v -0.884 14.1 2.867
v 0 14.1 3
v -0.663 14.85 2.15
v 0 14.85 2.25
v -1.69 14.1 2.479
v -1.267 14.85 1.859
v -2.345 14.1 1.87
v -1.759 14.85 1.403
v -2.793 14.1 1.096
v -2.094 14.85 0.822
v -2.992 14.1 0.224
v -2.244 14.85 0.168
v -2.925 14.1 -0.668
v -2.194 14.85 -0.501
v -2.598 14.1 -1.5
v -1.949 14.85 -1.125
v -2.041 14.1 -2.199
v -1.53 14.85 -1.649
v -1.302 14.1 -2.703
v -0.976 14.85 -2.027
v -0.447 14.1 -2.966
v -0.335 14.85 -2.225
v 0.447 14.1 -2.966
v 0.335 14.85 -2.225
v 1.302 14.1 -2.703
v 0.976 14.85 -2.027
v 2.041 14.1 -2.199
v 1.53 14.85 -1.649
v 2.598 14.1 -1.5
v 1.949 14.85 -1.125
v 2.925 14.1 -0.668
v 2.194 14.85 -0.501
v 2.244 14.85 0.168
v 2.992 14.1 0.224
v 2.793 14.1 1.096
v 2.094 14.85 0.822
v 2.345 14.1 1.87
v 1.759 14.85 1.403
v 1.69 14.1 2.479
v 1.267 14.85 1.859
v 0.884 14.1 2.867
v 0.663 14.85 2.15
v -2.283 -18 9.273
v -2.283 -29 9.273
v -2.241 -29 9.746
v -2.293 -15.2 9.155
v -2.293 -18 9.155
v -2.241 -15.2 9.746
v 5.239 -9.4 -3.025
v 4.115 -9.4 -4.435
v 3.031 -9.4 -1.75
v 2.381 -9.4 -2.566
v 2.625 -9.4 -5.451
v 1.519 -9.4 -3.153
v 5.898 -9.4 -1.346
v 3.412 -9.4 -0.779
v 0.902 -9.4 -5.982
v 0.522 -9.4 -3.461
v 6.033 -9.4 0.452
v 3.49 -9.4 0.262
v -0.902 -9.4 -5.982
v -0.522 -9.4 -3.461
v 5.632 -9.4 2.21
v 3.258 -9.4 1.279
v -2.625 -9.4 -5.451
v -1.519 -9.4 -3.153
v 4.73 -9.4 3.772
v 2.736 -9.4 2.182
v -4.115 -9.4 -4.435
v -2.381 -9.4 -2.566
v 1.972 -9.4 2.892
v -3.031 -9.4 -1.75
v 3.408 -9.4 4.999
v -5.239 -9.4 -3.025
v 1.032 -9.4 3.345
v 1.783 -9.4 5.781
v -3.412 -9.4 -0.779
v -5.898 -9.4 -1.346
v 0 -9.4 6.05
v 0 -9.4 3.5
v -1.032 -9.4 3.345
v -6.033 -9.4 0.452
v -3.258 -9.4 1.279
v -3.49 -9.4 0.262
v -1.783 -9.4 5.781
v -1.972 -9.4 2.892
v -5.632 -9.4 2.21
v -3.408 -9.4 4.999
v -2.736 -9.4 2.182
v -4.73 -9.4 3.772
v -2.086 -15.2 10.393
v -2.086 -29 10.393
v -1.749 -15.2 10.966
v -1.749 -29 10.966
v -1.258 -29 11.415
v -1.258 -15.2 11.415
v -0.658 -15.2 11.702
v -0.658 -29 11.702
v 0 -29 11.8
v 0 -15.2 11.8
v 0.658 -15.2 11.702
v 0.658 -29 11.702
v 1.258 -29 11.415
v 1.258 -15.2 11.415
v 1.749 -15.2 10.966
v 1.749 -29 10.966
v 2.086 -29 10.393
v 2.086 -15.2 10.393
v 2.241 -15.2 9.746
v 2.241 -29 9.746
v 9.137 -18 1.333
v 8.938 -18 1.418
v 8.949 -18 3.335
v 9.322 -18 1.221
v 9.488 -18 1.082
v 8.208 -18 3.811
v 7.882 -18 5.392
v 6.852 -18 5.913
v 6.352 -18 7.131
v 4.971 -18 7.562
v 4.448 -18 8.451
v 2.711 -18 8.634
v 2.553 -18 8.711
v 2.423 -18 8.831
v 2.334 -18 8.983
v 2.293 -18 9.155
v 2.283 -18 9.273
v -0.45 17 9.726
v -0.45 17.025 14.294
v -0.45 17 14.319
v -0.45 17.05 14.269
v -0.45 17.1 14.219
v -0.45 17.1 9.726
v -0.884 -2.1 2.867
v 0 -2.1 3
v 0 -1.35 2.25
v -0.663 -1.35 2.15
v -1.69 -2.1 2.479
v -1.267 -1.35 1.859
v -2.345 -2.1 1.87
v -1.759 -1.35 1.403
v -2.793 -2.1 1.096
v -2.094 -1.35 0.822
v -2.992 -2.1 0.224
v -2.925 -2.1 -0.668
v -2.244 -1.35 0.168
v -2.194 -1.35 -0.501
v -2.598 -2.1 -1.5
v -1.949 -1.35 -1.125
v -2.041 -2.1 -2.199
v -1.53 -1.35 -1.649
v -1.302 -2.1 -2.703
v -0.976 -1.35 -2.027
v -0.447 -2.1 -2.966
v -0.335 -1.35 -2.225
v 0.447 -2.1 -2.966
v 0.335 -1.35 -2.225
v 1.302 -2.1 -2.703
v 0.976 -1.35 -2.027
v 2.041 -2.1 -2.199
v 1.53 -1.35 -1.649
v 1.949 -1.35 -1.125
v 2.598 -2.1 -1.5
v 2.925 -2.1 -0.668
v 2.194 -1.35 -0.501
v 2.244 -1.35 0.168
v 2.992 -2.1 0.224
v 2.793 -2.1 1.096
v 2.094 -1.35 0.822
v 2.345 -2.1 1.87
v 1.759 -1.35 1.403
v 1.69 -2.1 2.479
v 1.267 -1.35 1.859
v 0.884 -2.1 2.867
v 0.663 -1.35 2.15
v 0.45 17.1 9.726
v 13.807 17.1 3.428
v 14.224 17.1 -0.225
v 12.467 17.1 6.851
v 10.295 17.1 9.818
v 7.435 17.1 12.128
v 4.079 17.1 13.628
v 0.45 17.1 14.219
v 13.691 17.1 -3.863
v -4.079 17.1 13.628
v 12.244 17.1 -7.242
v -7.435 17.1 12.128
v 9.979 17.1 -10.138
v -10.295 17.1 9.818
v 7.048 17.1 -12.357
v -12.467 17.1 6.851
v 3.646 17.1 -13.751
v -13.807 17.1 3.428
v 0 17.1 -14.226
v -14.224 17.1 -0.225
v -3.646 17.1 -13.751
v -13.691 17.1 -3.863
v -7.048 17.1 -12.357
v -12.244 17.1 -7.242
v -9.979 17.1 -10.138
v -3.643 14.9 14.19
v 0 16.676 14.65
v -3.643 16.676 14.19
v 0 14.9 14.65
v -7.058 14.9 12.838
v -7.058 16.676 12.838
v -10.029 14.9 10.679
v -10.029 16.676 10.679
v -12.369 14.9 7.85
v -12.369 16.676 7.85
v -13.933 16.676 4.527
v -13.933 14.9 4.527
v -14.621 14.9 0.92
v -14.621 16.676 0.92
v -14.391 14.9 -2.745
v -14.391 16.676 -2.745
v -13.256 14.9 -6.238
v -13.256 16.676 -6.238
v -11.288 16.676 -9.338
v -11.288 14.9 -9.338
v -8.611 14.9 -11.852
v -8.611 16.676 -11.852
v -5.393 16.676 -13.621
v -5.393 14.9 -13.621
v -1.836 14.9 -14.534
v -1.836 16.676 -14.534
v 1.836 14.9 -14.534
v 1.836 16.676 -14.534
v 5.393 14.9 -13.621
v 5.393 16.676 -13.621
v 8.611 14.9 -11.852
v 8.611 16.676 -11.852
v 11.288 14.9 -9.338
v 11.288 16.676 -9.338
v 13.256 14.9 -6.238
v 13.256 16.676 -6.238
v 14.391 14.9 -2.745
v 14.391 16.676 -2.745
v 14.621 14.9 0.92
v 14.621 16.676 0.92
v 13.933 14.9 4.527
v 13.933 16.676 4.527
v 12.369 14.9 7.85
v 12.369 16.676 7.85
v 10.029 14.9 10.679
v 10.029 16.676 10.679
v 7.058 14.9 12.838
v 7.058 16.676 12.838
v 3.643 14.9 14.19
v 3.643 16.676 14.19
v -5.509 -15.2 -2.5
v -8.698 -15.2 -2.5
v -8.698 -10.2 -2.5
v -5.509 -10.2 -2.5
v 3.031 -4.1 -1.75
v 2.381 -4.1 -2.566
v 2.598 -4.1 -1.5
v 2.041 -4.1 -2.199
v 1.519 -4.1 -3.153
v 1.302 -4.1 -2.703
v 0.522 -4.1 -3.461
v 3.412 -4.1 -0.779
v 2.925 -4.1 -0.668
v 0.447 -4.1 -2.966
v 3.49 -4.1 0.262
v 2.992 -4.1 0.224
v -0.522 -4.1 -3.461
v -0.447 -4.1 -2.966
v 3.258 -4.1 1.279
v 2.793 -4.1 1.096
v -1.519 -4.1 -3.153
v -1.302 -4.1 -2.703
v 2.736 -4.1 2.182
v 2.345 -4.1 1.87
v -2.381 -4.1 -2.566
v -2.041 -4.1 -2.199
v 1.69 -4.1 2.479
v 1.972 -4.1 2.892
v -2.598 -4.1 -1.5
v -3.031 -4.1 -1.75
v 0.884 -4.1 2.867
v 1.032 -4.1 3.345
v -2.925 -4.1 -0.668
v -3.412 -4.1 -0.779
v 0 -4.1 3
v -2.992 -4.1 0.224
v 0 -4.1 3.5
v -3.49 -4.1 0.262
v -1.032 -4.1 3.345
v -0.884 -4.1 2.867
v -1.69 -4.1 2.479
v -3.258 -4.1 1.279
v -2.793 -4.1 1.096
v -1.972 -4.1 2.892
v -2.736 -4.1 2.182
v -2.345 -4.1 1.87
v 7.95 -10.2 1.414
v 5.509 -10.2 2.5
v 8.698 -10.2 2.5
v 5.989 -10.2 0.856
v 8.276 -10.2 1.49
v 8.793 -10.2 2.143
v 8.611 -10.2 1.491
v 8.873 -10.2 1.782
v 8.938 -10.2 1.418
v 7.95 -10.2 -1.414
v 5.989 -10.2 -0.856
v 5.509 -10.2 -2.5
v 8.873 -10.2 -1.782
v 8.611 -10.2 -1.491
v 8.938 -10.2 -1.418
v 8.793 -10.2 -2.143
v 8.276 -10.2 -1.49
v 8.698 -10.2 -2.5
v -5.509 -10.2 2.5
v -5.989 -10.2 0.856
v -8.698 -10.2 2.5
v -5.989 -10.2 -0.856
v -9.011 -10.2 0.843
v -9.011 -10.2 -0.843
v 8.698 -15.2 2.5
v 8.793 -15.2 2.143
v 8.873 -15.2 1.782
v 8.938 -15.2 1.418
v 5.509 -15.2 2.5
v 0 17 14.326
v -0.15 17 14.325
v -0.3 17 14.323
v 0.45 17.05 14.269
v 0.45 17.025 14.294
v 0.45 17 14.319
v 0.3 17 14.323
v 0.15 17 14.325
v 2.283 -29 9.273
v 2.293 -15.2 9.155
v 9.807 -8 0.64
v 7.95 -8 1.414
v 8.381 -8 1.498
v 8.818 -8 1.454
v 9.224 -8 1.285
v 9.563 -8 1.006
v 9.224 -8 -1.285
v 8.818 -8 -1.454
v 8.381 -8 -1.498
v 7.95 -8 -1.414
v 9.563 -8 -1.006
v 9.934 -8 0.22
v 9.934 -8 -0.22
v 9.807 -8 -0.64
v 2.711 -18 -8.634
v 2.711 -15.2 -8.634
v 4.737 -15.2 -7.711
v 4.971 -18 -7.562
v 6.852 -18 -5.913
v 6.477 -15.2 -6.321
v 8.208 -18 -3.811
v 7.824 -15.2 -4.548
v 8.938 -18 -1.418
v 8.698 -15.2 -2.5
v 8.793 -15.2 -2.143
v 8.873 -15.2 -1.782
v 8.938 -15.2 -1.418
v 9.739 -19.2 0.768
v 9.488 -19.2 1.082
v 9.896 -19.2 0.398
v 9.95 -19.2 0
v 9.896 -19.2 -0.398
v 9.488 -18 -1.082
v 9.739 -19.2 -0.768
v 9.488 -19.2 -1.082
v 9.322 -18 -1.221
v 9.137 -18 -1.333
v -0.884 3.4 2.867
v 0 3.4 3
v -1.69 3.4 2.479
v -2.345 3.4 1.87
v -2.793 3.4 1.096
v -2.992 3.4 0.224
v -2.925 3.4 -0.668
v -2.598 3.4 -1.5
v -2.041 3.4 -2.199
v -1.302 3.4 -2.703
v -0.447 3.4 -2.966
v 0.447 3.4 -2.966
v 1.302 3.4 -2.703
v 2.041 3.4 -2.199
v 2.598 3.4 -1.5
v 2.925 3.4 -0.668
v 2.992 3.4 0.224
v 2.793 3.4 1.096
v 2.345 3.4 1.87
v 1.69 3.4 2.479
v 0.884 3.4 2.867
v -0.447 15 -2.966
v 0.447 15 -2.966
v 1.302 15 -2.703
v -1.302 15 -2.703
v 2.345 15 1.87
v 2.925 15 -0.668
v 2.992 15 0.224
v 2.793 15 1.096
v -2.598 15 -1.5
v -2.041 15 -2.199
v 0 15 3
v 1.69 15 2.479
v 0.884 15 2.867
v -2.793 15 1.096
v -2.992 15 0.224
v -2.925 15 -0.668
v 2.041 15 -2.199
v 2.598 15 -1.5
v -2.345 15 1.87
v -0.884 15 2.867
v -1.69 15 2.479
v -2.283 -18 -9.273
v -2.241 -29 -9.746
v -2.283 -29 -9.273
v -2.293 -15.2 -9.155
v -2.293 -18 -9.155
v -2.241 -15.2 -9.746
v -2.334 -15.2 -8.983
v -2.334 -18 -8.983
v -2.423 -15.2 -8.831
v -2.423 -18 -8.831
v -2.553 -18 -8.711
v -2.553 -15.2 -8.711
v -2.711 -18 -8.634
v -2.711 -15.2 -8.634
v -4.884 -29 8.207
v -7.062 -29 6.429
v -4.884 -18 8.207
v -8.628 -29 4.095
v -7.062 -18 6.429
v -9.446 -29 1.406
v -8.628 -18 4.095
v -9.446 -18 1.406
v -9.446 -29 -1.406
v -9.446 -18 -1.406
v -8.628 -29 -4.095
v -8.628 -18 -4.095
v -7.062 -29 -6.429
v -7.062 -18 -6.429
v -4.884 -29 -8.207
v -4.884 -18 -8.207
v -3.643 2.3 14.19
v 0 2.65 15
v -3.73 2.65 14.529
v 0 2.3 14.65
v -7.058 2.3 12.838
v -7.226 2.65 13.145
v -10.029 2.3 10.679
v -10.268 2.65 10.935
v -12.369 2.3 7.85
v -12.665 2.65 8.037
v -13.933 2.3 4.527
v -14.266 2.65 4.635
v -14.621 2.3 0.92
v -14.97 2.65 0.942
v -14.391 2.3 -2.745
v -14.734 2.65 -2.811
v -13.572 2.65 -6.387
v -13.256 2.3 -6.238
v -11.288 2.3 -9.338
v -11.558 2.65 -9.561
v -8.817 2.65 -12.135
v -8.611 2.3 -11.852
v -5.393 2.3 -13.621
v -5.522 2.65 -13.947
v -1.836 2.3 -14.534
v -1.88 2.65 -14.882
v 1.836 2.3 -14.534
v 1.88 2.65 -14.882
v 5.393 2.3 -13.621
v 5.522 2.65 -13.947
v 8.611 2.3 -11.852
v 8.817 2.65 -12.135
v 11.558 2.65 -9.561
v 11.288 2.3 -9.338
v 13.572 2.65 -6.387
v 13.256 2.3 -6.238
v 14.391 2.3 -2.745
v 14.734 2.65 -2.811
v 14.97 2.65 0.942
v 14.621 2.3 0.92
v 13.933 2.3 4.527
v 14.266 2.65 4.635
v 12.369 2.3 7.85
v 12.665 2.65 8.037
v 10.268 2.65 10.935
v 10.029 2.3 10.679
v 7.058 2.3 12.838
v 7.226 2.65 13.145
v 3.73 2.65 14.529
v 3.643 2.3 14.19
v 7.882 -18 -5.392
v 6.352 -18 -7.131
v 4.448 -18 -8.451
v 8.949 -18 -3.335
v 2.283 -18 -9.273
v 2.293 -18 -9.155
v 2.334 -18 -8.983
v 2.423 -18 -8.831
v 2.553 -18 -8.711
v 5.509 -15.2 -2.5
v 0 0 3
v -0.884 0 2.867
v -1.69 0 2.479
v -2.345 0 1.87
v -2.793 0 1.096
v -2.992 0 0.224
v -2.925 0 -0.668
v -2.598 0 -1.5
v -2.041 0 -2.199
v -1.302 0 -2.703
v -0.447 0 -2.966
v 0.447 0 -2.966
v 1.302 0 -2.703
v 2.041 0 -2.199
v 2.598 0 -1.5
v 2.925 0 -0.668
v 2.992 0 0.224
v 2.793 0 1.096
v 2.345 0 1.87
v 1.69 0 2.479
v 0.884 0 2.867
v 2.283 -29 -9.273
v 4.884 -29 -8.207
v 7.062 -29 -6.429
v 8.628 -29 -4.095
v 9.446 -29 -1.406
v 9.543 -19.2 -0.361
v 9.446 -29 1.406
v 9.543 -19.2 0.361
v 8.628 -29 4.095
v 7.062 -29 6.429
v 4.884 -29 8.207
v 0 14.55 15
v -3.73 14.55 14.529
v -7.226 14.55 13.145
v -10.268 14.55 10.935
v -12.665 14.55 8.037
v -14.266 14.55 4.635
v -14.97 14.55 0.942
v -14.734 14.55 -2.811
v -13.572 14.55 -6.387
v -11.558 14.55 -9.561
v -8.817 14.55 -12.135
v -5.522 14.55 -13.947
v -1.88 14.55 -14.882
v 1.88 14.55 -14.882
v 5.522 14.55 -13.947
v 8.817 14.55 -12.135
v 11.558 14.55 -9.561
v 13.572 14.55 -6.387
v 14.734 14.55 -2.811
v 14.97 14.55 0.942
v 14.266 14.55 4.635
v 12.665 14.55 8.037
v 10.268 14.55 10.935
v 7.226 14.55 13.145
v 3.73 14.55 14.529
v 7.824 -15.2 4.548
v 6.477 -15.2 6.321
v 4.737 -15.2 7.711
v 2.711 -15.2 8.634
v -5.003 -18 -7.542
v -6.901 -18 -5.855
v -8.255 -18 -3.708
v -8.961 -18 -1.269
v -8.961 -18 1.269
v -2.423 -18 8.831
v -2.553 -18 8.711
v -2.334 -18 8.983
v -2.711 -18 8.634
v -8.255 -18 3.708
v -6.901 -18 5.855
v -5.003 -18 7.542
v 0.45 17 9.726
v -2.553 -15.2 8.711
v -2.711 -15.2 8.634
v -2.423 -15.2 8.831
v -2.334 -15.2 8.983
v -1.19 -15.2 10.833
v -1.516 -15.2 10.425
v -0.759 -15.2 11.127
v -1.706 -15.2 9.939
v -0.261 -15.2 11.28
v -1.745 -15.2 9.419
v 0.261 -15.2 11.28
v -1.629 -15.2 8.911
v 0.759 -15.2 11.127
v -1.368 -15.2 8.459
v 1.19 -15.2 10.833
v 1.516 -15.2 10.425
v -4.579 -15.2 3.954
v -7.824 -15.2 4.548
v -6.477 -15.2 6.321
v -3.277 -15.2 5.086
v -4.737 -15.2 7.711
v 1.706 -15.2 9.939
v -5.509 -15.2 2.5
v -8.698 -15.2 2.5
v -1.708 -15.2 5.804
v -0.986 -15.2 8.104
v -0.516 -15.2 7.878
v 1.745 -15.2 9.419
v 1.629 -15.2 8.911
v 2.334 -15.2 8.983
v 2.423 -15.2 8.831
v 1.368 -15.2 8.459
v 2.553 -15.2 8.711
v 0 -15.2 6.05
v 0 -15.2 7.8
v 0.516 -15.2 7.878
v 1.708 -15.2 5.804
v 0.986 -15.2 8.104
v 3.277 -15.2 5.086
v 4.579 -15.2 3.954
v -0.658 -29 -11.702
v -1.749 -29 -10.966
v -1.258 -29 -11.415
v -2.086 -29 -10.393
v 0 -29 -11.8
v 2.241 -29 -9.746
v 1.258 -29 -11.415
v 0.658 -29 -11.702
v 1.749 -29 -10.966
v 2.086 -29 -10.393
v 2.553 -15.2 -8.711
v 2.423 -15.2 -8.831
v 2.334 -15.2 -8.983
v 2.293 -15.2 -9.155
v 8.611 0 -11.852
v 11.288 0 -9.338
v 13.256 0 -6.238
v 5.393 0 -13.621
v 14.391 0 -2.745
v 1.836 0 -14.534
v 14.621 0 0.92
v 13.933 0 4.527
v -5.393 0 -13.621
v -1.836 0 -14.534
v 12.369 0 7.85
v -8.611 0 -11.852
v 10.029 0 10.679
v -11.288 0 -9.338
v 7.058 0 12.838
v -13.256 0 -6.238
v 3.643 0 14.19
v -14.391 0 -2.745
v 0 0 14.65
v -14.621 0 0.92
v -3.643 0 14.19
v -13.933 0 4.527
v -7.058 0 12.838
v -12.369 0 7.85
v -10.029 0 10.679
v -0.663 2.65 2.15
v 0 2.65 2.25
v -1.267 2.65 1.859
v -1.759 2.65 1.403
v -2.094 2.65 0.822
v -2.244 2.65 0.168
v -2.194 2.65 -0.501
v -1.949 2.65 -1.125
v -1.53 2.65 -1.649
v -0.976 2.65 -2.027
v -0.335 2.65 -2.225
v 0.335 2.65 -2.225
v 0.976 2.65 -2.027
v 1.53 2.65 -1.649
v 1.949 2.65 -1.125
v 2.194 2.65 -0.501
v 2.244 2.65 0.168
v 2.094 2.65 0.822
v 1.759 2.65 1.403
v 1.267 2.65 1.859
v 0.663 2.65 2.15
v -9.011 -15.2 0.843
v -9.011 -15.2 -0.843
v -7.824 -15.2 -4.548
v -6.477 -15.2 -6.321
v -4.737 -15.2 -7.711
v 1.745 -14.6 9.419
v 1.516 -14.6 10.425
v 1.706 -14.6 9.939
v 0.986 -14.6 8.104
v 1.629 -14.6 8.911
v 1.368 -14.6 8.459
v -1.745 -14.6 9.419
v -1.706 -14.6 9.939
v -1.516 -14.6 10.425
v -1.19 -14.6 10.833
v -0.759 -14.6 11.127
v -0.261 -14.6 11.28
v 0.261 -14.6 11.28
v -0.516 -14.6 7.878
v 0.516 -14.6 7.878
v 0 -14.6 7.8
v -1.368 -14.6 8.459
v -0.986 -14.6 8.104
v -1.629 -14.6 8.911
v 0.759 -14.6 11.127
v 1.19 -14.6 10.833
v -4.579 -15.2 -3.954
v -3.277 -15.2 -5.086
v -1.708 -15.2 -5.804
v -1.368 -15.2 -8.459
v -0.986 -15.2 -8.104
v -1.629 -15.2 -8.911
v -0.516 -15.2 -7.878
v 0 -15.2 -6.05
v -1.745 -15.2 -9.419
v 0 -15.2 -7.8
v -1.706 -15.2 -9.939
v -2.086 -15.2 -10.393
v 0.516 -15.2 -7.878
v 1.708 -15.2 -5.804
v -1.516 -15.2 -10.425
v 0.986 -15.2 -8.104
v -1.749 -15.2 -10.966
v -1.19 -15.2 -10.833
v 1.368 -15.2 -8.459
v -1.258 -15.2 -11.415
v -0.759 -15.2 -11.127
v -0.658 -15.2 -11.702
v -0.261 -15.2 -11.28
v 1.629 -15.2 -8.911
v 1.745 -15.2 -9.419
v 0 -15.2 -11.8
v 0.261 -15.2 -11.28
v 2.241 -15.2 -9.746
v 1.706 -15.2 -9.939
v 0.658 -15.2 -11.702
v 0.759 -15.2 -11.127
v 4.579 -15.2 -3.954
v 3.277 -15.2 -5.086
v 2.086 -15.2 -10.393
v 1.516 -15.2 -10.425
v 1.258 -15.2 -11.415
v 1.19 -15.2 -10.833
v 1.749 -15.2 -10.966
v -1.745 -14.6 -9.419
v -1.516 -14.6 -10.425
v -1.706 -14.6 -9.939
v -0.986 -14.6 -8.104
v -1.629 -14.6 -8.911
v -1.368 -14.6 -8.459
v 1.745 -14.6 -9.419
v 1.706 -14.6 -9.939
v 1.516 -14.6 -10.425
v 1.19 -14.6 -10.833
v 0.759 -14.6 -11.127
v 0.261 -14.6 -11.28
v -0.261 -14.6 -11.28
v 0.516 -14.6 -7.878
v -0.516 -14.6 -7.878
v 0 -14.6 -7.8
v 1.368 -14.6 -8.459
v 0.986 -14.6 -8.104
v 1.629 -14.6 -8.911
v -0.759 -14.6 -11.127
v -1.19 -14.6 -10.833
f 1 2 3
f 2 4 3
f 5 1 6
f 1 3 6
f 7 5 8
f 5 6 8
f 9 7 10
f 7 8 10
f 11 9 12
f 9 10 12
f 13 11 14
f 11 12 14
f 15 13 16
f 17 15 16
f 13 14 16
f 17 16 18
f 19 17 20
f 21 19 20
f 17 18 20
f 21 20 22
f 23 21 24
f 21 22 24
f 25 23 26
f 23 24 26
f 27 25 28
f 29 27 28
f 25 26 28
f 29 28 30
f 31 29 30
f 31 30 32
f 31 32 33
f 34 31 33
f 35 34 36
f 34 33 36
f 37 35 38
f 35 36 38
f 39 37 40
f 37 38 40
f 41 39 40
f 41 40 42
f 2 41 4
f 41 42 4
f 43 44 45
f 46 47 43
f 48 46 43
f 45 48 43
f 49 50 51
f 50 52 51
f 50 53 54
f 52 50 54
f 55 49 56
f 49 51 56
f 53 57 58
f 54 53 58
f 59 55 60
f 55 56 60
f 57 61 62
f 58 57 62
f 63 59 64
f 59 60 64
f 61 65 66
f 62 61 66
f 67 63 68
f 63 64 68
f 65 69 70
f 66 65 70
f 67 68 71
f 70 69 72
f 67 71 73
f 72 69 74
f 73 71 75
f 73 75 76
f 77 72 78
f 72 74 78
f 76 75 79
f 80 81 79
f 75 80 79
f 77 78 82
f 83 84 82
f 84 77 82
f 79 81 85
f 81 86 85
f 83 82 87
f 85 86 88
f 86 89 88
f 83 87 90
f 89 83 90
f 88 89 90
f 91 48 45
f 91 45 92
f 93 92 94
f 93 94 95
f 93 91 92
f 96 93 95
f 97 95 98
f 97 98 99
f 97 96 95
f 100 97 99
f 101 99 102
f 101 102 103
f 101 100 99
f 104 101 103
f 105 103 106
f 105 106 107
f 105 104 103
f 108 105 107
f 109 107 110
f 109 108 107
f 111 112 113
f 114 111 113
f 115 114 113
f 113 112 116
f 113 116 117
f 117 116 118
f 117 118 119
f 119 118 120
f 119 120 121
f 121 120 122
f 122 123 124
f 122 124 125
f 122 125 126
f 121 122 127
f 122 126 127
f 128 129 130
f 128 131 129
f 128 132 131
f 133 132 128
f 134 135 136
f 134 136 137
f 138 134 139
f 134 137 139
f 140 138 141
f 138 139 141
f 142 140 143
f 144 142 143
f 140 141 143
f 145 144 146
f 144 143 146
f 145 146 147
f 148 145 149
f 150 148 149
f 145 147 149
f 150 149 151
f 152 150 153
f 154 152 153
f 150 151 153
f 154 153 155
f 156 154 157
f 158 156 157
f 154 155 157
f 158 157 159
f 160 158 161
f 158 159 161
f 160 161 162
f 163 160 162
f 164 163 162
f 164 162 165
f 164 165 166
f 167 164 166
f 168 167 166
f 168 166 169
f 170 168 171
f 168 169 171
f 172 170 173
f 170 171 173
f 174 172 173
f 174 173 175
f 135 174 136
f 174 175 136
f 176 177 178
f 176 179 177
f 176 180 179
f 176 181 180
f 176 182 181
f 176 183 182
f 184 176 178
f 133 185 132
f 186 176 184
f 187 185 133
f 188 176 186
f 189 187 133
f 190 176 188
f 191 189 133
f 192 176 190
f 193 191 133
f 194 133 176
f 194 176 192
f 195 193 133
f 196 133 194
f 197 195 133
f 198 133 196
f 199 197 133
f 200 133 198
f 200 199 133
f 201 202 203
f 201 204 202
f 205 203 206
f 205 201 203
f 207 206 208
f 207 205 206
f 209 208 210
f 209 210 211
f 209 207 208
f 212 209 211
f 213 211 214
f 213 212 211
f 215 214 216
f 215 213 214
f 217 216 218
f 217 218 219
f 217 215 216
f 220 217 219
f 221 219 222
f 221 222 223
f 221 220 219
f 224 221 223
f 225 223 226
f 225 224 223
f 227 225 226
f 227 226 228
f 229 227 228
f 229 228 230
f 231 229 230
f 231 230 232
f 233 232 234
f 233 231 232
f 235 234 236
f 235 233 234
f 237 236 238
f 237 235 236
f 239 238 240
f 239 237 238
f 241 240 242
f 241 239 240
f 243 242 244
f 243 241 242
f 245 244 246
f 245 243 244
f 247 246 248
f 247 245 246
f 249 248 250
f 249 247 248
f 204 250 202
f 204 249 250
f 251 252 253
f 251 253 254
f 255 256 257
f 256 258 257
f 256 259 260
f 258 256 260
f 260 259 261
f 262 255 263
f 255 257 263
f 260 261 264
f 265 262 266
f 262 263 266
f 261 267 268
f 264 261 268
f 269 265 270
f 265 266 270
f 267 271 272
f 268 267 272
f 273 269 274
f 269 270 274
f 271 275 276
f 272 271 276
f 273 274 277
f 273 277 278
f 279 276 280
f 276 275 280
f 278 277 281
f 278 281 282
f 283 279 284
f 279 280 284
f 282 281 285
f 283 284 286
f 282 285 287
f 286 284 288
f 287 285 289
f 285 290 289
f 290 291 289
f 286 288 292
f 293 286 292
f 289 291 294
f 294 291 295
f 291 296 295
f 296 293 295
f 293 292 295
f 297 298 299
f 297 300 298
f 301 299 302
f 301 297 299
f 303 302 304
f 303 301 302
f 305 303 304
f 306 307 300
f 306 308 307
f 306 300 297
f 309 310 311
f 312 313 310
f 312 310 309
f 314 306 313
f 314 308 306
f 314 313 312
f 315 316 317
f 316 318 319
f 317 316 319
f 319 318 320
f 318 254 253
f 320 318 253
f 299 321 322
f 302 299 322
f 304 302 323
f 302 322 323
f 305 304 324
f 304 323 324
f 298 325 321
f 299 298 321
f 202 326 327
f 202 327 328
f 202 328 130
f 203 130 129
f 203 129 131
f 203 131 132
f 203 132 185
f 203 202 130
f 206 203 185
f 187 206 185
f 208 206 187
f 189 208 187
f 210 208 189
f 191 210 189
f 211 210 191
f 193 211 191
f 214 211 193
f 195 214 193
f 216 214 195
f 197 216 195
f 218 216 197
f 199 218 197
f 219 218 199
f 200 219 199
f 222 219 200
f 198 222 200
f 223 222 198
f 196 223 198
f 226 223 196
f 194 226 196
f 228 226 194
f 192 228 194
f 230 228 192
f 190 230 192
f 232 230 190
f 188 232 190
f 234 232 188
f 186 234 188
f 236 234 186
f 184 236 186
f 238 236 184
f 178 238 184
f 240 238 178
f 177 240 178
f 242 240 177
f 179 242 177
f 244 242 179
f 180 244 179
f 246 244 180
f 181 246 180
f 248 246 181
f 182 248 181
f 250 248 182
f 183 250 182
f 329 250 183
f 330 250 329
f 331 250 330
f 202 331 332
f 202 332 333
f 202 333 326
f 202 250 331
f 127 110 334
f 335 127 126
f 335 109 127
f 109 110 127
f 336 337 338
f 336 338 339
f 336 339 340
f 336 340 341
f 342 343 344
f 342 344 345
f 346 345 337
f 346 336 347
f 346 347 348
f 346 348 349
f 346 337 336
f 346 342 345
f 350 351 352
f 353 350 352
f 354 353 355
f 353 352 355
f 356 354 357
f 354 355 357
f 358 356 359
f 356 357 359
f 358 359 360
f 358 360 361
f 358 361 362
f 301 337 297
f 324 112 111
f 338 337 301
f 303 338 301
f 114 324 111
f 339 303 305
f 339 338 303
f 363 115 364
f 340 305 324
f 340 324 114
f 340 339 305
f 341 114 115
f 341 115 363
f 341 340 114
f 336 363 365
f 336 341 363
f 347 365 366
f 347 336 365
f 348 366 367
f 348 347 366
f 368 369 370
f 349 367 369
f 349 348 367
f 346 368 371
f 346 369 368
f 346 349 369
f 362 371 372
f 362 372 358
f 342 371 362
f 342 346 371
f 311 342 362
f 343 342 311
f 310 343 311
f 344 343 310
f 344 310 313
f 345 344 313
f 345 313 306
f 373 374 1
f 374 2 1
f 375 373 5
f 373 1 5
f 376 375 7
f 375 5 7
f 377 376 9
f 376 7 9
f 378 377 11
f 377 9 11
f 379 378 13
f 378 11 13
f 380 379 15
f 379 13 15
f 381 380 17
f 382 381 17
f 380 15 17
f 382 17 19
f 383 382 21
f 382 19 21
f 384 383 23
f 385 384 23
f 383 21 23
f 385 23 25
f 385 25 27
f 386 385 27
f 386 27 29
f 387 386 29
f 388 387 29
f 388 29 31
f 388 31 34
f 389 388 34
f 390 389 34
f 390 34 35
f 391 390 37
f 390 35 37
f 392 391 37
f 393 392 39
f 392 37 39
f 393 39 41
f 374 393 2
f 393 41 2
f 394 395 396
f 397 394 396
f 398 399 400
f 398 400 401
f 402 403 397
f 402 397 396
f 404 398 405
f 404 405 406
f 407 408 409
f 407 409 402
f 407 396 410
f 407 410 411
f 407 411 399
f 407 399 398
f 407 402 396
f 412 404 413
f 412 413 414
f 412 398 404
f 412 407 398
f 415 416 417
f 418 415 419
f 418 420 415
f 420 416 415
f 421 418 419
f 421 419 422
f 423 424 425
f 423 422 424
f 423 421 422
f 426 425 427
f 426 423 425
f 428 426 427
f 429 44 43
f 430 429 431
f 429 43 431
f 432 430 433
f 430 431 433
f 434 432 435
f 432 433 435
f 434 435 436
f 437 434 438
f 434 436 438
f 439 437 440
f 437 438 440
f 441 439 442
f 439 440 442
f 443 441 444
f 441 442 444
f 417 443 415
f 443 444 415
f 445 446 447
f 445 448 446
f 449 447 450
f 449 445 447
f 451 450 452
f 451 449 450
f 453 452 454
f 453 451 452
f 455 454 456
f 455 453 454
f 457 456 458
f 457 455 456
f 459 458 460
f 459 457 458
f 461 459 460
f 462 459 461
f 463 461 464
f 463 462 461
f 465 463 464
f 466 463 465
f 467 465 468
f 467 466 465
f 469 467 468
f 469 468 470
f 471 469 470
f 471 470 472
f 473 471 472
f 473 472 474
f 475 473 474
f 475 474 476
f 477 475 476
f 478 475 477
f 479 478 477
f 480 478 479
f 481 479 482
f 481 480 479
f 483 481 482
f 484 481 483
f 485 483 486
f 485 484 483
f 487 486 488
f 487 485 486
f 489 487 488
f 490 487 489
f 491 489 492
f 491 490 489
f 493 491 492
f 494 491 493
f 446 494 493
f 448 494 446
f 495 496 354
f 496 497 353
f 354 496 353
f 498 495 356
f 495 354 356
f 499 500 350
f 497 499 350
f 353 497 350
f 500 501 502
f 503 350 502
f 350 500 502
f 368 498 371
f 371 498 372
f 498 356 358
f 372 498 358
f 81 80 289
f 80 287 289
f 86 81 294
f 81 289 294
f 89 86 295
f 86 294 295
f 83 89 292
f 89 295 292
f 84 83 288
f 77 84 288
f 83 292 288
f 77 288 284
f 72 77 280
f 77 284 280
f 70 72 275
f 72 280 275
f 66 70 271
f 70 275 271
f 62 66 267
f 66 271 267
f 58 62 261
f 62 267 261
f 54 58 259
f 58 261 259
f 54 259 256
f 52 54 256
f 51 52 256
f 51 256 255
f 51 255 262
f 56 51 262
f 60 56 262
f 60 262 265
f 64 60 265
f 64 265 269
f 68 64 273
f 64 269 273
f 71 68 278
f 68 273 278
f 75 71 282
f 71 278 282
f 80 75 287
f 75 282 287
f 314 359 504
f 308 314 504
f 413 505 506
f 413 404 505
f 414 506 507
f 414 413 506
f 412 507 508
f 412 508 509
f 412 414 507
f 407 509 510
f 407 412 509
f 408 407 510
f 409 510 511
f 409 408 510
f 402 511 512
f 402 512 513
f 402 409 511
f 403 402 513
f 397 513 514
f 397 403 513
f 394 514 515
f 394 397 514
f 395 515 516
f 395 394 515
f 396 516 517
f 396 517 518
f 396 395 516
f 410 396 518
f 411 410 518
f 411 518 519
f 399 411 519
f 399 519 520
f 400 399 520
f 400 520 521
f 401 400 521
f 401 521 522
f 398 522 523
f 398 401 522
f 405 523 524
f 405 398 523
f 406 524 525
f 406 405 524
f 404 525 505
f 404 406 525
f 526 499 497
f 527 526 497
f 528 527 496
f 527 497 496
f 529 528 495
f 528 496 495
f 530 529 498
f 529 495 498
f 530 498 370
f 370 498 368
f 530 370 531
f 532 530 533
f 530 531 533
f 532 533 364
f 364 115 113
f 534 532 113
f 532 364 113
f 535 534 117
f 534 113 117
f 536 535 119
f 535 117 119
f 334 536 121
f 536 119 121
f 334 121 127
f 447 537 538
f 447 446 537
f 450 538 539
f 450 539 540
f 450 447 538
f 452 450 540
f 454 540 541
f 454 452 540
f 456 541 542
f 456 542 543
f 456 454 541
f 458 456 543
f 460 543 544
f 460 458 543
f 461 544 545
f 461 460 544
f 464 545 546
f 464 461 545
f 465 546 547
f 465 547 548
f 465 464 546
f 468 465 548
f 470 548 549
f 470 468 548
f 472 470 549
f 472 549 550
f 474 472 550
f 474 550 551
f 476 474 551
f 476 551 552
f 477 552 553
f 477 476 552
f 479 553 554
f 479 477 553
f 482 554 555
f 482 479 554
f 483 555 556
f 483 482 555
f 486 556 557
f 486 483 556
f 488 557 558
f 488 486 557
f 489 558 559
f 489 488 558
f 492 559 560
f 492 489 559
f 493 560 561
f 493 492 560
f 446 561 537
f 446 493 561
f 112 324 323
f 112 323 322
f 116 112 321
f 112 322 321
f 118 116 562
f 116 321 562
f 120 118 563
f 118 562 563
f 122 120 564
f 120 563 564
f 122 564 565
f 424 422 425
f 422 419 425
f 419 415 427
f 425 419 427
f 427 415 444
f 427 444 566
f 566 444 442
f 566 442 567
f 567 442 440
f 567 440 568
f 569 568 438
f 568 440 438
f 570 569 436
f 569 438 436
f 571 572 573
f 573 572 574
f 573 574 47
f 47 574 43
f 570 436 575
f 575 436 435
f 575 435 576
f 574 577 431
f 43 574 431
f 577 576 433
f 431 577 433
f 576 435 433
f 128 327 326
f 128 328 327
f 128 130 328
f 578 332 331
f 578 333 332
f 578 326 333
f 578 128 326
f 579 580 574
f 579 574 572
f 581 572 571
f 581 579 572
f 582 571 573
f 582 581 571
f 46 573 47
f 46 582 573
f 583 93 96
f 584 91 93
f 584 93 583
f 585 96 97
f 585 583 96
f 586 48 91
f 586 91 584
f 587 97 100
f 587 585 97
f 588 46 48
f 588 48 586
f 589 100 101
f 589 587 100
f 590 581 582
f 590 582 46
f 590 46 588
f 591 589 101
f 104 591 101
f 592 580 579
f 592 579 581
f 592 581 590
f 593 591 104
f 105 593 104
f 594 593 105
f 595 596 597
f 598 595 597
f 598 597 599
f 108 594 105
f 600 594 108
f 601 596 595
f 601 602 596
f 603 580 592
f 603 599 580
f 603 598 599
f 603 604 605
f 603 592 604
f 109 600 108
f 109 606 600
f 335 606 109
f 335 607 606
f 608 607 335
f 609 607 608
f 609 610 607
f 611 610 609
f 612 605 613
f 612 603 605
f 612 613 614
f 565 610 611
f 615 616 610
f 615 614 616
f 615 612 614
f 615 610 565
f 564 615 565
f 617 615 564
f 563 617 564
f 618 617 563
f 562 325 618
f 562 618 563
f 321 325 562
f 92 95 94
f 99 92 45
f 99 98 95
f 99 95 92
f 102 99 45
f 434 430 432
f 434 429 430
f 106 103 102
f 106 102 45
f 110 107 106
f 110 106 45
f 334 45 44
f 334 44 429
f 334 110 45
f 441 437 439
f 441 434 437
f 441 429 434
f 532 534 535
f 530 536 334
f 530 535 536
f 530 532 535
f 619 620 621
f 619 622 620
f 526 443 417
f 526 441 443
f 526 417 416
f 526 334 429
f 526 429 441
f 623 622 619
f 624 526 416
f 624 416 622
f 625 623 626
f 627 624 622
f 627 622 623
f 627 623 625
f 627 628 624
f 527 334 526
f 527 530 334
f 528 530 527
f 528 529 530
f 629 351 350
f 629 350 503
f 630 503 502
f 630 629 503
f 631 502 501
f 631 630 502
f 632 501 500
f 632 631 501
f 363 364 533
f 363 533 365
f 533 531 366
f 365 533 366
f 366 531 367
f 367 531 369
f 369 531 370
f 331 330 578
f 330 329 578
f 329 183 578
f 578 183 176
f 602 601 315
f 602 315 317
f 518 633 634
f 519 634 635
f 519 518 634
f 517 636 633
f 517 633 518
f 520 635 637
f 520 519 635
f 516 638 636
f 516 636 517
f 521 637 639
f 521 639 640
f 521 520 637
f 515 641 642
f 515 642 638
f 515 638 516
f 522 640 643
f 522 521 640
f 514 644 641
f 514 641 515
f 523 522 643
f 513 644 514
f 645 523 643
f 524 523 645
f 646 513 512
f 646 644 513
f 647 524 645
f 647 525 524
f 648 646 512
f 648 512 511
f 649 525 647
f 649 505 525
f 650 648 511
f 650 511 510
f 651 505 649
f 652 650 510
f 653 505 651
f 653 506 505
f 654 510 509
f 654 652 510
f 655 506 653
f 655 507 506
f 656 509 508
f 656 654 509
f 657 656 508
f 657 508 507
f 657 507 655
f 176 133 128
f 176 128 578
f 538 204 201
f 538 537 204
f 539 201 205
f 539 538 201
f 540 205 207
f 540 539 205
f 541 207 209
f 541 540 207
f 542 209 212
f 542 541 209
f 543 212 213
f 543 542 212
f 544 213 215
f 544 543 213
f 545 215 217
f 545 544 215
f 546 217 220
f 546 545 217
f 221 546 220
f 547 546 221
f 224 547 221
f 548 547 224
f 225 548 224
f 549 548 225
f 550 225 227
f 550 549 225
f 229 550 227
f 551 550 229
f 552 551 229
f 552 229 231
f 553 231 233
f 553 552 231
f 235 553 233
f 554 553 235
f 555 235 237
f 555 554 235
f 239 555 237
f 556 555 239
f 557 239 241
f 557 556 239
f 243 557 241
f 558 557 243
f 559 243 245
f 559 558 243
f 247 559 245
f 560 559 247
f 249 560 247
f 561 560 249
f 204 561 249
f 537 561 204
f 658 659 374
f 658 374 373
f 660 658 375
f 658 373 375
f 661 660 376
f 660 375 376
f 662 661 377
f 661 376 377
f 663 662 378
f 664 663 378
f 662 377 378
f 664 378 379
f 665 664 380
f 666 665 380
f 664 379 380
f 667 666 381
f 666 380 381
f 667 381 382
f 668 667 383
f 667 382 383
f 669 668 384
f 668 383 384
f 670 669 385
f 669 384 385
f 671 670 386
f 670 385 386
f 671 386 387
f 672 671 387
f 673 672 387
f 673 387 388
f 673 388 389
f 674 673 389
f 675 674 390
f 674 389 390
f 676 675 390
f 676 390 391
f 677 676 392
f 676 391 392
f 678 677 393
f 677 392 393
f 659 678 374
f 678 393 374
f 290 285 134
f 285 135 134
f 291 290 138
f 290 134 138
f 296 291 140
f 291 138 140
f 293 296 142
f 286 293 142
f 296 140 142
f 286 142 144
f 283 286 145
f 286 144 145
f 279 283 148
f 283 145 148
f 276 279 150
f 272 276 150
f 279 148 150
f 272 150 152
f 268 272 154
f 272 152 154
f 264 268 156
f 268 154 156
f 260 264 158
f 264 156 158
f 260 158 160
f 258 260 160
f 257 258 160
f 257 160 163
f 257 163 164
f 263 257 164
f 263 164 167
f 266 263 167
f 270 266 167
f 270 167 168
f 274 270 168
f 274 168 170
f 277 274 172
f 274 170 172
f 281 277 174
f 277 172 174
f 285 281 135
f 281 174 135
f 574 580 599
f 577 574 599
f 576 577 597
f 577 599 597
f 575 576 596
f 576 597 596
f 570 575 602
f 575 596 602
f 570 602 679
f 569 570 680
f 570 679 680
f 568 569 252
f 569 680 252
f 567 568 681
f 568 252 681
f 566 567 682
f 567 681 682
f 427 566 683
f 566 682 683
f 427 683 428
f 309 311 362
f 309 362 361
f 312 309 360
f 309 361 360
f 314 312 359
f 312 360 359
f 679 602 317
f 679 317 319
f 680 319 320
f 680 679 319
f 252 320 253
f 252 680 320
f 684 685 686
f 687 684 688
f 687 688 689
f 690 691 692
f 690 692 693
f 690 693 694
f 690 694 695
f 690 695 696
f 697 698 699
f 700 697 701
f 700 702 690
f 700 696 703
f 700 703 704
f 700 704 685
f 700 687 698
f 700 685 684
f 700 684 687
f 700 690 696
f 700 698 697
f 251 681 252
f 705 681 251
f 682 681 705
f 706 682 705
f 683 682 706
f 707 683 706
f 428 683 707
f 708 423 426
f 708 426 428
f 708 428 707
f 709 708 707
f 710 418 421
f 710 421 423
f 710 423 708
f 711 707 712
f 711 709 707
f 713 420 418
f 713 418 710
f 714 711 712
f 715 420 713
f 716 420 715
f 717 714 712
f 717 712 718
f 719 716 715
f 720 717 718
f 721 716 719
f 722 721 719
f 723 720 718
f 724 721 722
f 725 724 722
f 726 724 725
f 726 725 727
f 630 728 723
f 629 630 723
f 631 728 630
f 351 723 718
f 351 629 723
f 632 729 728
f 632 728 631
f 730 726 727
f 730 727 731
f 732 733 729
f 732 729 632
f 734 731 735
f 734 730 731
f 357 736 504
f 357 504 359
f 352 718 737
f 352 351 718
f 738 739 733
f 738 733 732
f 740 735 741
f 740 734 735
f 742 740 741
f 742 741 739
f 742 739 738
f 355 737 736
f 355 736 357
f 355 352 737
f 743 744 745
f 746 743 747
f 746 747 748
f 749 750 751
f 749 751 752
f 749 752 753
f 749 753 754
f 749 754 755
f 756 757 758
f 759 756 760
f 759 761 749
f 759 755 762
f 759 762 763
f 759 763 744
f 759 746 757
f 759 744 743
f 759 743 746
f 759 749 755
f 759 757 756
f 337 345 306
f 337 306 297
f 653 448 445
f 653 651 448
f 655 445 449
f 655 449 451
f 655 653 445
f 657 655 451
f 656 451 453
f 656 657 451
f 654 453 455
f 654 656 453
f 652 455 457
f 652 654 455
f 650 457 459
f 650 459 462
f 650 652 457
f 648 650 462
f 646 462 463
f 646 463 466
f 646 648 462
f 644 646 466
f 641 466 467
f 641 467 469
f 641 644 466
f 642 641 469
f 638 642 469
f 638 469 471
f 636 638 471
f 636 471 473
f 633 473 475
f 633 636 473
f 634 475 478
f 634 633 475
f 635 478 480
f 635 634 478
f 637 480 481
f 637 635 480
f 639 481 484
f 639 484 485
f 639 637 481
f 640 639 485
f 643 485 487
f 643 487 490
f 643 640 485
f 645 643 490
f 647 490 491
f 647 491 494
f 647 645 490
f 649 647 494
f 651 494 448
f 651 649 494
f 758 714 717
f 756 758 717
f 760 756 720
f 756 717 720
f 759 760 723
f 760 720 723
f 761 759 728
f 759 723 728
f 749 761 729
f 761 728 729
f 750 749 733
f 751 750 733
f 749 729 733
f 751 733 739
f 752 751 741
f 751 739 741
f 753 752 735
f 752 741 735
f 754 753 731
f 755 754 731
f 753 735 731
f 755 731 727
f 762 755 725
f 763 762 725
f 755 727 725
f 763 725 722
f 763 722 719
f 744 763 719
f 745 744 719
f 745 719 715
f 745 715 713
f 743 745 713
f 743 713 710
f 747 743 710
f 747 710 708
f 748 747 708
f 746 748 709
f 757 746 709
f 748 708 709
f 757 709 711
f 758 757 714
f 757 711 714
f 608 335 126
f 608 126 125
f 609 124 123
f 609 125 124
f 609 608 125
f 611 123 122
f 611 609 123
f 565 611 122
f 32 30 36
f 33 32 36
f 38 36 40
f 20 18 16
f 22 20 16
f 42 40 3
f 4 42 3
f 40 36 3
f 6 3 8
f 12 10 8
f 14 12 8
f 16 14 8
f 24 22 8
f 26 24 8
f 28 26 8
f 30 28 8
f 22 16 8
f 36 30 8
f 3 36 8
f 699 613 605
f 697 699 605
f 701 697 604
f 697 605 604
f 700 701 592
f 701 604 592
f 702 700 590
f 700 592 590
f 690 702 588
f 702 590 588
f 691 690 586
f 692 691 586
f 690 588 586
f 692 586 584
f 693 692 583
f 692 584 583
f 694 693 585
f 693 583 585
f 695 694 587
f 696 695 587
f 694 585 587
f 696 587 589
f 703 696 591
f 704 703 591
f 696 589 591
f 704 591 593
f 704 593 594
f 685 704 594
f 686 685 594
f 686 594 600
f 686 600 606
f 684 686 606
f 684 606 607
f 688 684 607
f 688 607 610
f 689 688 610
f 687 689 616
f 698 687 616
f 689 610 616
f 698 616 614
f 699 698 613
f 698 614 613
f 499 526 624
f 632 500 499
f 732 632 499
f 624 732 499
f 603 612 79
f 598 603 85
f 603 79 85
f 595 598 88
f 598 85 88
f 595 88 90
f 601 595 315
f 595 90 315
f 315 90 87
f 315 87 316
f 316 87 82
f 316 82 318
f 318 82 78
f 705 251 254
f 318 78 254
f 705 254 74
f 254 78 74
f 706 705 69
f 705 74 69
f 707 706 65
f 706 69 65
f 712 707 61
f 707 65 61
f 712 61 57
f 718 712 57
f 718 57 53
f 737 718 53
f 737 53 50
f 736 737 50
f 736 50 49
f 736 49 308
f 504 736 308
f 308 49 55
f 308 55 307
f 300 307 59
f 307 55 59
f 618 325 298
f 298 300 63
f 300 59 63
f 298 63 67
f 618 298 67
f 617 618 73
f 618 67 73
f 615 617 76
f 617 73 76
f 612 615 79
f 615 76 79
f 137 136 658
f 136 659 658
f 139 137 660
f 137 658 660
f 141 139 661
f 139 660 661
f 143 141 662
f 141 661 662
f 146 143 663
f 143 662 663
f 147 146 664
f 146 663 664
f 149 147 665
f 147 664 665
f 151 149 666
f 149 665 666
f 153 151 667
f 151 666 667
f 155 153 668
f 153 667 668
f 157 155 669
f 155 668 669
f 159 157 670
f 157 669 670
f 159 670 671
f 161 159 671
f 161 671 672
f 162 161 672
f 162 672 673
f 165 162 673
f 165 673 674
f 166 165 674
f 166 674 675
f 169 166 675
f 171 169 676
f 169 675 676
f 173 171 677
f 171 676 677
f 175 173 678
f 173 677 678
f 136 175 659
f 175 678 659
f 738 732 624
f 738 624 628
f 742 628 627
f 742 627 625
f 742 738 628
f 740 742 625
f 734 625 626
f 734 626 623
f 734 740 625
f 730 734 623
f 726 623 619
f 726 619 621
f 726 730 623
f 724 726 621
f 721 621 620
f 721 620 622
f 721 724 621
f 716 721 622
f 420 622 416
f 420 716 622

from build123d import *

# Parameters (mm, degrees)
EXTRUDE_1_DEPTH     = 5
EXTRUDE_START       = 2.2
EXTRUDE_2_DEPTH     = 11.2
EXTRUDE_3_REACH     = 40.643
SKETCH_6_R          = 1.75
EXTRUDE_4_DEPTH     = 0.6
SKETCH_7_W          = 0.9
SKETCH_7_H          = 10
CUT_EXTRUDE_1_DEPTH = 0.1


with BuildPart() as part:
    # 草圖2 → 旋轉1 (revolve)
    with BuildSketch(Plane(origin=(0, 0, 0), x_dir=(0, 0, -1), z_dir=(1, 0, 0)), mode=Mode.PRIVATE) as revolve_1_sk:
        Polygon((0, 15), (0, 17.1), (14.225735931, 17.1), (14.65, 16.675735931), (14.65, 14.9), (15, 14.55), (15, 2.65), (14.65, 2.3), (14.65, 0), (3, 0), (3, 15), align=None)
    revolve(revolve_1_sk.sketch.rotate(Axis((0, 22.612531688, 0), (0, -1, 0)), 180), axis=Axis((0, 22.612531688, 0), (0, -1, 0)))

    # 草圖7 → 除料-伸長1 (cut)
    with BuildSketch(Plane(origin=(0, 17.1, 0), x_dir=(1, 0, 0), z_dir=(0, 1, 0))):
        with Locations((0, -14.725735931)):
            Rectangle(SKETCH_7_W, SKETCH_7_H)
    extrude(amount=-CUT_EXTRUDE_1_DEPTH, mode=Mode.SUBTRACT)


with BuildPart() as body_2:
    # 草圖2<4> → 旋轉2 (revolve)
    with BuildSketch(Plane(origin=(0, 0, 0), x_dir=(0, 0, -1), z_dir=(1, 0, 0)), mode=Mode.PRIVATE) as revolve_2_sk:
        Polygon((3, 3.4), (3, 14.1), (2.25, 14.85), (0, 14.85), (0, -29), (9.55, -29), (9.55, -18), (9.05, -18), (9.05, -15.2), (6.05, -15.2), (6.05, -9.4), (3.5, -9.4), (3.5, -4.1), (3, -4.1), (3, -2.1), (2.25, -1.35), (2.25, 2.65), align=None)
    revolve(revolve_2_sk.sketch.rotate(Axis((0, 22.612531688, 0), (0, -1, 0)), 180), axis=Axis((0, 22.612531688, 0), (0, -1, 0)))

    # 草圖3 → 填料-伸長1 (add)
    with BuildSketch(Plane(origin=(0, -15.2, 0), x_dir=(1, 0, 0), z_dir=(0, 1, 0))):
        with BuildLine():
            Line((8.697844561, 2.5), (5.509310302, 2.5))
            Line((5.509310302, 2.5), (5.509310302, -2.5))
            Line((5.509310302, -2.5), (8.697844561, -2.5))
            ThreePointArc((8.697844561, -2.5), (9.05, 0), (8.697844561, 2.5))
        make_face()
        with BuildLine():
            Line((-5.509310302, 2.5), (-5.509310302, -2.5))
            Line((-5.509310302, -2.5), (-8.697844561, -2.5))
            ThreePointArc((-8.697844561, -2.5), (-9.05, 0), (-8.697844561, 2.5))
            Line((-8.697844561, 2.5), (-5.509310302, 2.5))
        make_face()
    extrude(amount=EXTRUDE_1_DEPTH)

    # 草圖4 → 填料-伸長2 (add)
    with BuildSketch(Plane(origin=(0, -10.2, 0), x_dir=(1, 0, 0), z_dir=(0, 1, 0)).offset(EXTRUDE_START)):
        with BuildLine():
            Line((7.95, 1.414213562), (7.95, -1.414213562))
            ThreePointArc((7.95, -1.414213562), (9.95, 0), (7.95, 1.414213562))
        make_face()
    extrude(amount=-EXTRUDE_2_DEPTH)

    # 填料-伸長3: up to this face of the body (flat: up to its plane)
    extrude_3_end = Plane(body_2.part.faces().sort_by_distance((0, -29, 0))[0])
    # 草圖5 → 填料-伸長3 (add, up to the picked face)
    with BuildSketch(Plane(origin=(0, -15.2, 0), x_dir=(1, 0, 0), z_dir=(0, 1, 0)), mode=Mode.PRIVATE) as extrude_3_sk1:
        with BuildLine():
            Line((-2.241438071, 9.746100421), (-2.293196033, 9.1545042))
            ThreePointArc((-2.293196033, 9.1545042), (-2.423204558, 8.830966631), (-2.711166976, 8.634354268))
            Line((-2.711166976, 8.634354268), (2.711166976, 8.634354268))
            ThreePointArc((2.711166976, 8.634354268), (2.423204558, 8.830966631), (2.293196033, 9.1545042))
            Line((2.293196033, 9.1545042), (2.241438071, 9.746100421))
            ThreePointArc((2.241438071, 9.746100421), (0, 11.8), (-2.241438071, 9.746100421))
        make_face()
    extrude_3_tool1 = split(extrude(extrude_3_sk1.sketch, amount=-EXTRUDE_3_REACH, mode=Mode.PRIVATE), bisect_by=extrude_3_end, keep=Keep.BOTH, mode=Mode.PRIVATE)
    # 草圖5 → 填料-伸長3 (add, up to the picked face)
    with BuildSketch(Plane(origin=(0, -15.2, 0), x_dir=(1, 0, 0), z_dir=(0, 1, 0)), mode=Mode.PRIVATE) as extrude_3_sk2:
        with BuildLine():
            Line((2.241438071, -9.746100421), (2.293196033, -9.1545042))
            ThreePointArc((2.293196033, -9.1545042), (2.423204558, -8.830966631), (2.711166976, -8.634354268))
            Line((2.711166976, -8.634354268), (-2.711166976, -8.634354268))
            ThreePointArc((-2.711166976, -8.634354268), (-2.423204558, -8.830966631), (-2.293196033, -9.1545042))
            Line((-2.293196033, -9.1545042), (-2.241438071, -9.746100421))
            ThreePointArc((-2.241438071, -9.746100421), (0, -11.8), (2.241438071, -9.746100421))
        make_face()
    extrude_3_tool2 = split(extrude(extrude_3_sk2.sketch, amount=-EXTRUDE_3_REACH, mode=Mode.PRIVATE), bisect_by=extrude_3_end, keep=Keep.BOTH, mode=Mode.PRIVATE)
    add(extrude_3_tool1.solids().sort_by(Axis((0, -15.2, -10.004484), (0, -1, 0)))[0])
    add(extrude_3_tool2.solids().sort_by(Axis((0, -15.2, 10.004484), (0, -1, 0)))[0])

    # 草圖6 → 填料-伸長4 (add)
    with BuildSketch(Plane(origin=(0, -15.2, 0), x_dir=(1, 0, 0), z_dir=(0, 1, 0))):
        with Locations(Location((0, 9.55, 0), (0, 0, 270))):
            Circle(SKETCH_6_R)
        with Locations(Location((0, -9.55, 0), (0, 0, 90))):
            Circle(SKETCH_6_R)
    extrude(amount=EXTRUDE_4_DEPTH)


solid = Compound([part.part, body_2.part])
